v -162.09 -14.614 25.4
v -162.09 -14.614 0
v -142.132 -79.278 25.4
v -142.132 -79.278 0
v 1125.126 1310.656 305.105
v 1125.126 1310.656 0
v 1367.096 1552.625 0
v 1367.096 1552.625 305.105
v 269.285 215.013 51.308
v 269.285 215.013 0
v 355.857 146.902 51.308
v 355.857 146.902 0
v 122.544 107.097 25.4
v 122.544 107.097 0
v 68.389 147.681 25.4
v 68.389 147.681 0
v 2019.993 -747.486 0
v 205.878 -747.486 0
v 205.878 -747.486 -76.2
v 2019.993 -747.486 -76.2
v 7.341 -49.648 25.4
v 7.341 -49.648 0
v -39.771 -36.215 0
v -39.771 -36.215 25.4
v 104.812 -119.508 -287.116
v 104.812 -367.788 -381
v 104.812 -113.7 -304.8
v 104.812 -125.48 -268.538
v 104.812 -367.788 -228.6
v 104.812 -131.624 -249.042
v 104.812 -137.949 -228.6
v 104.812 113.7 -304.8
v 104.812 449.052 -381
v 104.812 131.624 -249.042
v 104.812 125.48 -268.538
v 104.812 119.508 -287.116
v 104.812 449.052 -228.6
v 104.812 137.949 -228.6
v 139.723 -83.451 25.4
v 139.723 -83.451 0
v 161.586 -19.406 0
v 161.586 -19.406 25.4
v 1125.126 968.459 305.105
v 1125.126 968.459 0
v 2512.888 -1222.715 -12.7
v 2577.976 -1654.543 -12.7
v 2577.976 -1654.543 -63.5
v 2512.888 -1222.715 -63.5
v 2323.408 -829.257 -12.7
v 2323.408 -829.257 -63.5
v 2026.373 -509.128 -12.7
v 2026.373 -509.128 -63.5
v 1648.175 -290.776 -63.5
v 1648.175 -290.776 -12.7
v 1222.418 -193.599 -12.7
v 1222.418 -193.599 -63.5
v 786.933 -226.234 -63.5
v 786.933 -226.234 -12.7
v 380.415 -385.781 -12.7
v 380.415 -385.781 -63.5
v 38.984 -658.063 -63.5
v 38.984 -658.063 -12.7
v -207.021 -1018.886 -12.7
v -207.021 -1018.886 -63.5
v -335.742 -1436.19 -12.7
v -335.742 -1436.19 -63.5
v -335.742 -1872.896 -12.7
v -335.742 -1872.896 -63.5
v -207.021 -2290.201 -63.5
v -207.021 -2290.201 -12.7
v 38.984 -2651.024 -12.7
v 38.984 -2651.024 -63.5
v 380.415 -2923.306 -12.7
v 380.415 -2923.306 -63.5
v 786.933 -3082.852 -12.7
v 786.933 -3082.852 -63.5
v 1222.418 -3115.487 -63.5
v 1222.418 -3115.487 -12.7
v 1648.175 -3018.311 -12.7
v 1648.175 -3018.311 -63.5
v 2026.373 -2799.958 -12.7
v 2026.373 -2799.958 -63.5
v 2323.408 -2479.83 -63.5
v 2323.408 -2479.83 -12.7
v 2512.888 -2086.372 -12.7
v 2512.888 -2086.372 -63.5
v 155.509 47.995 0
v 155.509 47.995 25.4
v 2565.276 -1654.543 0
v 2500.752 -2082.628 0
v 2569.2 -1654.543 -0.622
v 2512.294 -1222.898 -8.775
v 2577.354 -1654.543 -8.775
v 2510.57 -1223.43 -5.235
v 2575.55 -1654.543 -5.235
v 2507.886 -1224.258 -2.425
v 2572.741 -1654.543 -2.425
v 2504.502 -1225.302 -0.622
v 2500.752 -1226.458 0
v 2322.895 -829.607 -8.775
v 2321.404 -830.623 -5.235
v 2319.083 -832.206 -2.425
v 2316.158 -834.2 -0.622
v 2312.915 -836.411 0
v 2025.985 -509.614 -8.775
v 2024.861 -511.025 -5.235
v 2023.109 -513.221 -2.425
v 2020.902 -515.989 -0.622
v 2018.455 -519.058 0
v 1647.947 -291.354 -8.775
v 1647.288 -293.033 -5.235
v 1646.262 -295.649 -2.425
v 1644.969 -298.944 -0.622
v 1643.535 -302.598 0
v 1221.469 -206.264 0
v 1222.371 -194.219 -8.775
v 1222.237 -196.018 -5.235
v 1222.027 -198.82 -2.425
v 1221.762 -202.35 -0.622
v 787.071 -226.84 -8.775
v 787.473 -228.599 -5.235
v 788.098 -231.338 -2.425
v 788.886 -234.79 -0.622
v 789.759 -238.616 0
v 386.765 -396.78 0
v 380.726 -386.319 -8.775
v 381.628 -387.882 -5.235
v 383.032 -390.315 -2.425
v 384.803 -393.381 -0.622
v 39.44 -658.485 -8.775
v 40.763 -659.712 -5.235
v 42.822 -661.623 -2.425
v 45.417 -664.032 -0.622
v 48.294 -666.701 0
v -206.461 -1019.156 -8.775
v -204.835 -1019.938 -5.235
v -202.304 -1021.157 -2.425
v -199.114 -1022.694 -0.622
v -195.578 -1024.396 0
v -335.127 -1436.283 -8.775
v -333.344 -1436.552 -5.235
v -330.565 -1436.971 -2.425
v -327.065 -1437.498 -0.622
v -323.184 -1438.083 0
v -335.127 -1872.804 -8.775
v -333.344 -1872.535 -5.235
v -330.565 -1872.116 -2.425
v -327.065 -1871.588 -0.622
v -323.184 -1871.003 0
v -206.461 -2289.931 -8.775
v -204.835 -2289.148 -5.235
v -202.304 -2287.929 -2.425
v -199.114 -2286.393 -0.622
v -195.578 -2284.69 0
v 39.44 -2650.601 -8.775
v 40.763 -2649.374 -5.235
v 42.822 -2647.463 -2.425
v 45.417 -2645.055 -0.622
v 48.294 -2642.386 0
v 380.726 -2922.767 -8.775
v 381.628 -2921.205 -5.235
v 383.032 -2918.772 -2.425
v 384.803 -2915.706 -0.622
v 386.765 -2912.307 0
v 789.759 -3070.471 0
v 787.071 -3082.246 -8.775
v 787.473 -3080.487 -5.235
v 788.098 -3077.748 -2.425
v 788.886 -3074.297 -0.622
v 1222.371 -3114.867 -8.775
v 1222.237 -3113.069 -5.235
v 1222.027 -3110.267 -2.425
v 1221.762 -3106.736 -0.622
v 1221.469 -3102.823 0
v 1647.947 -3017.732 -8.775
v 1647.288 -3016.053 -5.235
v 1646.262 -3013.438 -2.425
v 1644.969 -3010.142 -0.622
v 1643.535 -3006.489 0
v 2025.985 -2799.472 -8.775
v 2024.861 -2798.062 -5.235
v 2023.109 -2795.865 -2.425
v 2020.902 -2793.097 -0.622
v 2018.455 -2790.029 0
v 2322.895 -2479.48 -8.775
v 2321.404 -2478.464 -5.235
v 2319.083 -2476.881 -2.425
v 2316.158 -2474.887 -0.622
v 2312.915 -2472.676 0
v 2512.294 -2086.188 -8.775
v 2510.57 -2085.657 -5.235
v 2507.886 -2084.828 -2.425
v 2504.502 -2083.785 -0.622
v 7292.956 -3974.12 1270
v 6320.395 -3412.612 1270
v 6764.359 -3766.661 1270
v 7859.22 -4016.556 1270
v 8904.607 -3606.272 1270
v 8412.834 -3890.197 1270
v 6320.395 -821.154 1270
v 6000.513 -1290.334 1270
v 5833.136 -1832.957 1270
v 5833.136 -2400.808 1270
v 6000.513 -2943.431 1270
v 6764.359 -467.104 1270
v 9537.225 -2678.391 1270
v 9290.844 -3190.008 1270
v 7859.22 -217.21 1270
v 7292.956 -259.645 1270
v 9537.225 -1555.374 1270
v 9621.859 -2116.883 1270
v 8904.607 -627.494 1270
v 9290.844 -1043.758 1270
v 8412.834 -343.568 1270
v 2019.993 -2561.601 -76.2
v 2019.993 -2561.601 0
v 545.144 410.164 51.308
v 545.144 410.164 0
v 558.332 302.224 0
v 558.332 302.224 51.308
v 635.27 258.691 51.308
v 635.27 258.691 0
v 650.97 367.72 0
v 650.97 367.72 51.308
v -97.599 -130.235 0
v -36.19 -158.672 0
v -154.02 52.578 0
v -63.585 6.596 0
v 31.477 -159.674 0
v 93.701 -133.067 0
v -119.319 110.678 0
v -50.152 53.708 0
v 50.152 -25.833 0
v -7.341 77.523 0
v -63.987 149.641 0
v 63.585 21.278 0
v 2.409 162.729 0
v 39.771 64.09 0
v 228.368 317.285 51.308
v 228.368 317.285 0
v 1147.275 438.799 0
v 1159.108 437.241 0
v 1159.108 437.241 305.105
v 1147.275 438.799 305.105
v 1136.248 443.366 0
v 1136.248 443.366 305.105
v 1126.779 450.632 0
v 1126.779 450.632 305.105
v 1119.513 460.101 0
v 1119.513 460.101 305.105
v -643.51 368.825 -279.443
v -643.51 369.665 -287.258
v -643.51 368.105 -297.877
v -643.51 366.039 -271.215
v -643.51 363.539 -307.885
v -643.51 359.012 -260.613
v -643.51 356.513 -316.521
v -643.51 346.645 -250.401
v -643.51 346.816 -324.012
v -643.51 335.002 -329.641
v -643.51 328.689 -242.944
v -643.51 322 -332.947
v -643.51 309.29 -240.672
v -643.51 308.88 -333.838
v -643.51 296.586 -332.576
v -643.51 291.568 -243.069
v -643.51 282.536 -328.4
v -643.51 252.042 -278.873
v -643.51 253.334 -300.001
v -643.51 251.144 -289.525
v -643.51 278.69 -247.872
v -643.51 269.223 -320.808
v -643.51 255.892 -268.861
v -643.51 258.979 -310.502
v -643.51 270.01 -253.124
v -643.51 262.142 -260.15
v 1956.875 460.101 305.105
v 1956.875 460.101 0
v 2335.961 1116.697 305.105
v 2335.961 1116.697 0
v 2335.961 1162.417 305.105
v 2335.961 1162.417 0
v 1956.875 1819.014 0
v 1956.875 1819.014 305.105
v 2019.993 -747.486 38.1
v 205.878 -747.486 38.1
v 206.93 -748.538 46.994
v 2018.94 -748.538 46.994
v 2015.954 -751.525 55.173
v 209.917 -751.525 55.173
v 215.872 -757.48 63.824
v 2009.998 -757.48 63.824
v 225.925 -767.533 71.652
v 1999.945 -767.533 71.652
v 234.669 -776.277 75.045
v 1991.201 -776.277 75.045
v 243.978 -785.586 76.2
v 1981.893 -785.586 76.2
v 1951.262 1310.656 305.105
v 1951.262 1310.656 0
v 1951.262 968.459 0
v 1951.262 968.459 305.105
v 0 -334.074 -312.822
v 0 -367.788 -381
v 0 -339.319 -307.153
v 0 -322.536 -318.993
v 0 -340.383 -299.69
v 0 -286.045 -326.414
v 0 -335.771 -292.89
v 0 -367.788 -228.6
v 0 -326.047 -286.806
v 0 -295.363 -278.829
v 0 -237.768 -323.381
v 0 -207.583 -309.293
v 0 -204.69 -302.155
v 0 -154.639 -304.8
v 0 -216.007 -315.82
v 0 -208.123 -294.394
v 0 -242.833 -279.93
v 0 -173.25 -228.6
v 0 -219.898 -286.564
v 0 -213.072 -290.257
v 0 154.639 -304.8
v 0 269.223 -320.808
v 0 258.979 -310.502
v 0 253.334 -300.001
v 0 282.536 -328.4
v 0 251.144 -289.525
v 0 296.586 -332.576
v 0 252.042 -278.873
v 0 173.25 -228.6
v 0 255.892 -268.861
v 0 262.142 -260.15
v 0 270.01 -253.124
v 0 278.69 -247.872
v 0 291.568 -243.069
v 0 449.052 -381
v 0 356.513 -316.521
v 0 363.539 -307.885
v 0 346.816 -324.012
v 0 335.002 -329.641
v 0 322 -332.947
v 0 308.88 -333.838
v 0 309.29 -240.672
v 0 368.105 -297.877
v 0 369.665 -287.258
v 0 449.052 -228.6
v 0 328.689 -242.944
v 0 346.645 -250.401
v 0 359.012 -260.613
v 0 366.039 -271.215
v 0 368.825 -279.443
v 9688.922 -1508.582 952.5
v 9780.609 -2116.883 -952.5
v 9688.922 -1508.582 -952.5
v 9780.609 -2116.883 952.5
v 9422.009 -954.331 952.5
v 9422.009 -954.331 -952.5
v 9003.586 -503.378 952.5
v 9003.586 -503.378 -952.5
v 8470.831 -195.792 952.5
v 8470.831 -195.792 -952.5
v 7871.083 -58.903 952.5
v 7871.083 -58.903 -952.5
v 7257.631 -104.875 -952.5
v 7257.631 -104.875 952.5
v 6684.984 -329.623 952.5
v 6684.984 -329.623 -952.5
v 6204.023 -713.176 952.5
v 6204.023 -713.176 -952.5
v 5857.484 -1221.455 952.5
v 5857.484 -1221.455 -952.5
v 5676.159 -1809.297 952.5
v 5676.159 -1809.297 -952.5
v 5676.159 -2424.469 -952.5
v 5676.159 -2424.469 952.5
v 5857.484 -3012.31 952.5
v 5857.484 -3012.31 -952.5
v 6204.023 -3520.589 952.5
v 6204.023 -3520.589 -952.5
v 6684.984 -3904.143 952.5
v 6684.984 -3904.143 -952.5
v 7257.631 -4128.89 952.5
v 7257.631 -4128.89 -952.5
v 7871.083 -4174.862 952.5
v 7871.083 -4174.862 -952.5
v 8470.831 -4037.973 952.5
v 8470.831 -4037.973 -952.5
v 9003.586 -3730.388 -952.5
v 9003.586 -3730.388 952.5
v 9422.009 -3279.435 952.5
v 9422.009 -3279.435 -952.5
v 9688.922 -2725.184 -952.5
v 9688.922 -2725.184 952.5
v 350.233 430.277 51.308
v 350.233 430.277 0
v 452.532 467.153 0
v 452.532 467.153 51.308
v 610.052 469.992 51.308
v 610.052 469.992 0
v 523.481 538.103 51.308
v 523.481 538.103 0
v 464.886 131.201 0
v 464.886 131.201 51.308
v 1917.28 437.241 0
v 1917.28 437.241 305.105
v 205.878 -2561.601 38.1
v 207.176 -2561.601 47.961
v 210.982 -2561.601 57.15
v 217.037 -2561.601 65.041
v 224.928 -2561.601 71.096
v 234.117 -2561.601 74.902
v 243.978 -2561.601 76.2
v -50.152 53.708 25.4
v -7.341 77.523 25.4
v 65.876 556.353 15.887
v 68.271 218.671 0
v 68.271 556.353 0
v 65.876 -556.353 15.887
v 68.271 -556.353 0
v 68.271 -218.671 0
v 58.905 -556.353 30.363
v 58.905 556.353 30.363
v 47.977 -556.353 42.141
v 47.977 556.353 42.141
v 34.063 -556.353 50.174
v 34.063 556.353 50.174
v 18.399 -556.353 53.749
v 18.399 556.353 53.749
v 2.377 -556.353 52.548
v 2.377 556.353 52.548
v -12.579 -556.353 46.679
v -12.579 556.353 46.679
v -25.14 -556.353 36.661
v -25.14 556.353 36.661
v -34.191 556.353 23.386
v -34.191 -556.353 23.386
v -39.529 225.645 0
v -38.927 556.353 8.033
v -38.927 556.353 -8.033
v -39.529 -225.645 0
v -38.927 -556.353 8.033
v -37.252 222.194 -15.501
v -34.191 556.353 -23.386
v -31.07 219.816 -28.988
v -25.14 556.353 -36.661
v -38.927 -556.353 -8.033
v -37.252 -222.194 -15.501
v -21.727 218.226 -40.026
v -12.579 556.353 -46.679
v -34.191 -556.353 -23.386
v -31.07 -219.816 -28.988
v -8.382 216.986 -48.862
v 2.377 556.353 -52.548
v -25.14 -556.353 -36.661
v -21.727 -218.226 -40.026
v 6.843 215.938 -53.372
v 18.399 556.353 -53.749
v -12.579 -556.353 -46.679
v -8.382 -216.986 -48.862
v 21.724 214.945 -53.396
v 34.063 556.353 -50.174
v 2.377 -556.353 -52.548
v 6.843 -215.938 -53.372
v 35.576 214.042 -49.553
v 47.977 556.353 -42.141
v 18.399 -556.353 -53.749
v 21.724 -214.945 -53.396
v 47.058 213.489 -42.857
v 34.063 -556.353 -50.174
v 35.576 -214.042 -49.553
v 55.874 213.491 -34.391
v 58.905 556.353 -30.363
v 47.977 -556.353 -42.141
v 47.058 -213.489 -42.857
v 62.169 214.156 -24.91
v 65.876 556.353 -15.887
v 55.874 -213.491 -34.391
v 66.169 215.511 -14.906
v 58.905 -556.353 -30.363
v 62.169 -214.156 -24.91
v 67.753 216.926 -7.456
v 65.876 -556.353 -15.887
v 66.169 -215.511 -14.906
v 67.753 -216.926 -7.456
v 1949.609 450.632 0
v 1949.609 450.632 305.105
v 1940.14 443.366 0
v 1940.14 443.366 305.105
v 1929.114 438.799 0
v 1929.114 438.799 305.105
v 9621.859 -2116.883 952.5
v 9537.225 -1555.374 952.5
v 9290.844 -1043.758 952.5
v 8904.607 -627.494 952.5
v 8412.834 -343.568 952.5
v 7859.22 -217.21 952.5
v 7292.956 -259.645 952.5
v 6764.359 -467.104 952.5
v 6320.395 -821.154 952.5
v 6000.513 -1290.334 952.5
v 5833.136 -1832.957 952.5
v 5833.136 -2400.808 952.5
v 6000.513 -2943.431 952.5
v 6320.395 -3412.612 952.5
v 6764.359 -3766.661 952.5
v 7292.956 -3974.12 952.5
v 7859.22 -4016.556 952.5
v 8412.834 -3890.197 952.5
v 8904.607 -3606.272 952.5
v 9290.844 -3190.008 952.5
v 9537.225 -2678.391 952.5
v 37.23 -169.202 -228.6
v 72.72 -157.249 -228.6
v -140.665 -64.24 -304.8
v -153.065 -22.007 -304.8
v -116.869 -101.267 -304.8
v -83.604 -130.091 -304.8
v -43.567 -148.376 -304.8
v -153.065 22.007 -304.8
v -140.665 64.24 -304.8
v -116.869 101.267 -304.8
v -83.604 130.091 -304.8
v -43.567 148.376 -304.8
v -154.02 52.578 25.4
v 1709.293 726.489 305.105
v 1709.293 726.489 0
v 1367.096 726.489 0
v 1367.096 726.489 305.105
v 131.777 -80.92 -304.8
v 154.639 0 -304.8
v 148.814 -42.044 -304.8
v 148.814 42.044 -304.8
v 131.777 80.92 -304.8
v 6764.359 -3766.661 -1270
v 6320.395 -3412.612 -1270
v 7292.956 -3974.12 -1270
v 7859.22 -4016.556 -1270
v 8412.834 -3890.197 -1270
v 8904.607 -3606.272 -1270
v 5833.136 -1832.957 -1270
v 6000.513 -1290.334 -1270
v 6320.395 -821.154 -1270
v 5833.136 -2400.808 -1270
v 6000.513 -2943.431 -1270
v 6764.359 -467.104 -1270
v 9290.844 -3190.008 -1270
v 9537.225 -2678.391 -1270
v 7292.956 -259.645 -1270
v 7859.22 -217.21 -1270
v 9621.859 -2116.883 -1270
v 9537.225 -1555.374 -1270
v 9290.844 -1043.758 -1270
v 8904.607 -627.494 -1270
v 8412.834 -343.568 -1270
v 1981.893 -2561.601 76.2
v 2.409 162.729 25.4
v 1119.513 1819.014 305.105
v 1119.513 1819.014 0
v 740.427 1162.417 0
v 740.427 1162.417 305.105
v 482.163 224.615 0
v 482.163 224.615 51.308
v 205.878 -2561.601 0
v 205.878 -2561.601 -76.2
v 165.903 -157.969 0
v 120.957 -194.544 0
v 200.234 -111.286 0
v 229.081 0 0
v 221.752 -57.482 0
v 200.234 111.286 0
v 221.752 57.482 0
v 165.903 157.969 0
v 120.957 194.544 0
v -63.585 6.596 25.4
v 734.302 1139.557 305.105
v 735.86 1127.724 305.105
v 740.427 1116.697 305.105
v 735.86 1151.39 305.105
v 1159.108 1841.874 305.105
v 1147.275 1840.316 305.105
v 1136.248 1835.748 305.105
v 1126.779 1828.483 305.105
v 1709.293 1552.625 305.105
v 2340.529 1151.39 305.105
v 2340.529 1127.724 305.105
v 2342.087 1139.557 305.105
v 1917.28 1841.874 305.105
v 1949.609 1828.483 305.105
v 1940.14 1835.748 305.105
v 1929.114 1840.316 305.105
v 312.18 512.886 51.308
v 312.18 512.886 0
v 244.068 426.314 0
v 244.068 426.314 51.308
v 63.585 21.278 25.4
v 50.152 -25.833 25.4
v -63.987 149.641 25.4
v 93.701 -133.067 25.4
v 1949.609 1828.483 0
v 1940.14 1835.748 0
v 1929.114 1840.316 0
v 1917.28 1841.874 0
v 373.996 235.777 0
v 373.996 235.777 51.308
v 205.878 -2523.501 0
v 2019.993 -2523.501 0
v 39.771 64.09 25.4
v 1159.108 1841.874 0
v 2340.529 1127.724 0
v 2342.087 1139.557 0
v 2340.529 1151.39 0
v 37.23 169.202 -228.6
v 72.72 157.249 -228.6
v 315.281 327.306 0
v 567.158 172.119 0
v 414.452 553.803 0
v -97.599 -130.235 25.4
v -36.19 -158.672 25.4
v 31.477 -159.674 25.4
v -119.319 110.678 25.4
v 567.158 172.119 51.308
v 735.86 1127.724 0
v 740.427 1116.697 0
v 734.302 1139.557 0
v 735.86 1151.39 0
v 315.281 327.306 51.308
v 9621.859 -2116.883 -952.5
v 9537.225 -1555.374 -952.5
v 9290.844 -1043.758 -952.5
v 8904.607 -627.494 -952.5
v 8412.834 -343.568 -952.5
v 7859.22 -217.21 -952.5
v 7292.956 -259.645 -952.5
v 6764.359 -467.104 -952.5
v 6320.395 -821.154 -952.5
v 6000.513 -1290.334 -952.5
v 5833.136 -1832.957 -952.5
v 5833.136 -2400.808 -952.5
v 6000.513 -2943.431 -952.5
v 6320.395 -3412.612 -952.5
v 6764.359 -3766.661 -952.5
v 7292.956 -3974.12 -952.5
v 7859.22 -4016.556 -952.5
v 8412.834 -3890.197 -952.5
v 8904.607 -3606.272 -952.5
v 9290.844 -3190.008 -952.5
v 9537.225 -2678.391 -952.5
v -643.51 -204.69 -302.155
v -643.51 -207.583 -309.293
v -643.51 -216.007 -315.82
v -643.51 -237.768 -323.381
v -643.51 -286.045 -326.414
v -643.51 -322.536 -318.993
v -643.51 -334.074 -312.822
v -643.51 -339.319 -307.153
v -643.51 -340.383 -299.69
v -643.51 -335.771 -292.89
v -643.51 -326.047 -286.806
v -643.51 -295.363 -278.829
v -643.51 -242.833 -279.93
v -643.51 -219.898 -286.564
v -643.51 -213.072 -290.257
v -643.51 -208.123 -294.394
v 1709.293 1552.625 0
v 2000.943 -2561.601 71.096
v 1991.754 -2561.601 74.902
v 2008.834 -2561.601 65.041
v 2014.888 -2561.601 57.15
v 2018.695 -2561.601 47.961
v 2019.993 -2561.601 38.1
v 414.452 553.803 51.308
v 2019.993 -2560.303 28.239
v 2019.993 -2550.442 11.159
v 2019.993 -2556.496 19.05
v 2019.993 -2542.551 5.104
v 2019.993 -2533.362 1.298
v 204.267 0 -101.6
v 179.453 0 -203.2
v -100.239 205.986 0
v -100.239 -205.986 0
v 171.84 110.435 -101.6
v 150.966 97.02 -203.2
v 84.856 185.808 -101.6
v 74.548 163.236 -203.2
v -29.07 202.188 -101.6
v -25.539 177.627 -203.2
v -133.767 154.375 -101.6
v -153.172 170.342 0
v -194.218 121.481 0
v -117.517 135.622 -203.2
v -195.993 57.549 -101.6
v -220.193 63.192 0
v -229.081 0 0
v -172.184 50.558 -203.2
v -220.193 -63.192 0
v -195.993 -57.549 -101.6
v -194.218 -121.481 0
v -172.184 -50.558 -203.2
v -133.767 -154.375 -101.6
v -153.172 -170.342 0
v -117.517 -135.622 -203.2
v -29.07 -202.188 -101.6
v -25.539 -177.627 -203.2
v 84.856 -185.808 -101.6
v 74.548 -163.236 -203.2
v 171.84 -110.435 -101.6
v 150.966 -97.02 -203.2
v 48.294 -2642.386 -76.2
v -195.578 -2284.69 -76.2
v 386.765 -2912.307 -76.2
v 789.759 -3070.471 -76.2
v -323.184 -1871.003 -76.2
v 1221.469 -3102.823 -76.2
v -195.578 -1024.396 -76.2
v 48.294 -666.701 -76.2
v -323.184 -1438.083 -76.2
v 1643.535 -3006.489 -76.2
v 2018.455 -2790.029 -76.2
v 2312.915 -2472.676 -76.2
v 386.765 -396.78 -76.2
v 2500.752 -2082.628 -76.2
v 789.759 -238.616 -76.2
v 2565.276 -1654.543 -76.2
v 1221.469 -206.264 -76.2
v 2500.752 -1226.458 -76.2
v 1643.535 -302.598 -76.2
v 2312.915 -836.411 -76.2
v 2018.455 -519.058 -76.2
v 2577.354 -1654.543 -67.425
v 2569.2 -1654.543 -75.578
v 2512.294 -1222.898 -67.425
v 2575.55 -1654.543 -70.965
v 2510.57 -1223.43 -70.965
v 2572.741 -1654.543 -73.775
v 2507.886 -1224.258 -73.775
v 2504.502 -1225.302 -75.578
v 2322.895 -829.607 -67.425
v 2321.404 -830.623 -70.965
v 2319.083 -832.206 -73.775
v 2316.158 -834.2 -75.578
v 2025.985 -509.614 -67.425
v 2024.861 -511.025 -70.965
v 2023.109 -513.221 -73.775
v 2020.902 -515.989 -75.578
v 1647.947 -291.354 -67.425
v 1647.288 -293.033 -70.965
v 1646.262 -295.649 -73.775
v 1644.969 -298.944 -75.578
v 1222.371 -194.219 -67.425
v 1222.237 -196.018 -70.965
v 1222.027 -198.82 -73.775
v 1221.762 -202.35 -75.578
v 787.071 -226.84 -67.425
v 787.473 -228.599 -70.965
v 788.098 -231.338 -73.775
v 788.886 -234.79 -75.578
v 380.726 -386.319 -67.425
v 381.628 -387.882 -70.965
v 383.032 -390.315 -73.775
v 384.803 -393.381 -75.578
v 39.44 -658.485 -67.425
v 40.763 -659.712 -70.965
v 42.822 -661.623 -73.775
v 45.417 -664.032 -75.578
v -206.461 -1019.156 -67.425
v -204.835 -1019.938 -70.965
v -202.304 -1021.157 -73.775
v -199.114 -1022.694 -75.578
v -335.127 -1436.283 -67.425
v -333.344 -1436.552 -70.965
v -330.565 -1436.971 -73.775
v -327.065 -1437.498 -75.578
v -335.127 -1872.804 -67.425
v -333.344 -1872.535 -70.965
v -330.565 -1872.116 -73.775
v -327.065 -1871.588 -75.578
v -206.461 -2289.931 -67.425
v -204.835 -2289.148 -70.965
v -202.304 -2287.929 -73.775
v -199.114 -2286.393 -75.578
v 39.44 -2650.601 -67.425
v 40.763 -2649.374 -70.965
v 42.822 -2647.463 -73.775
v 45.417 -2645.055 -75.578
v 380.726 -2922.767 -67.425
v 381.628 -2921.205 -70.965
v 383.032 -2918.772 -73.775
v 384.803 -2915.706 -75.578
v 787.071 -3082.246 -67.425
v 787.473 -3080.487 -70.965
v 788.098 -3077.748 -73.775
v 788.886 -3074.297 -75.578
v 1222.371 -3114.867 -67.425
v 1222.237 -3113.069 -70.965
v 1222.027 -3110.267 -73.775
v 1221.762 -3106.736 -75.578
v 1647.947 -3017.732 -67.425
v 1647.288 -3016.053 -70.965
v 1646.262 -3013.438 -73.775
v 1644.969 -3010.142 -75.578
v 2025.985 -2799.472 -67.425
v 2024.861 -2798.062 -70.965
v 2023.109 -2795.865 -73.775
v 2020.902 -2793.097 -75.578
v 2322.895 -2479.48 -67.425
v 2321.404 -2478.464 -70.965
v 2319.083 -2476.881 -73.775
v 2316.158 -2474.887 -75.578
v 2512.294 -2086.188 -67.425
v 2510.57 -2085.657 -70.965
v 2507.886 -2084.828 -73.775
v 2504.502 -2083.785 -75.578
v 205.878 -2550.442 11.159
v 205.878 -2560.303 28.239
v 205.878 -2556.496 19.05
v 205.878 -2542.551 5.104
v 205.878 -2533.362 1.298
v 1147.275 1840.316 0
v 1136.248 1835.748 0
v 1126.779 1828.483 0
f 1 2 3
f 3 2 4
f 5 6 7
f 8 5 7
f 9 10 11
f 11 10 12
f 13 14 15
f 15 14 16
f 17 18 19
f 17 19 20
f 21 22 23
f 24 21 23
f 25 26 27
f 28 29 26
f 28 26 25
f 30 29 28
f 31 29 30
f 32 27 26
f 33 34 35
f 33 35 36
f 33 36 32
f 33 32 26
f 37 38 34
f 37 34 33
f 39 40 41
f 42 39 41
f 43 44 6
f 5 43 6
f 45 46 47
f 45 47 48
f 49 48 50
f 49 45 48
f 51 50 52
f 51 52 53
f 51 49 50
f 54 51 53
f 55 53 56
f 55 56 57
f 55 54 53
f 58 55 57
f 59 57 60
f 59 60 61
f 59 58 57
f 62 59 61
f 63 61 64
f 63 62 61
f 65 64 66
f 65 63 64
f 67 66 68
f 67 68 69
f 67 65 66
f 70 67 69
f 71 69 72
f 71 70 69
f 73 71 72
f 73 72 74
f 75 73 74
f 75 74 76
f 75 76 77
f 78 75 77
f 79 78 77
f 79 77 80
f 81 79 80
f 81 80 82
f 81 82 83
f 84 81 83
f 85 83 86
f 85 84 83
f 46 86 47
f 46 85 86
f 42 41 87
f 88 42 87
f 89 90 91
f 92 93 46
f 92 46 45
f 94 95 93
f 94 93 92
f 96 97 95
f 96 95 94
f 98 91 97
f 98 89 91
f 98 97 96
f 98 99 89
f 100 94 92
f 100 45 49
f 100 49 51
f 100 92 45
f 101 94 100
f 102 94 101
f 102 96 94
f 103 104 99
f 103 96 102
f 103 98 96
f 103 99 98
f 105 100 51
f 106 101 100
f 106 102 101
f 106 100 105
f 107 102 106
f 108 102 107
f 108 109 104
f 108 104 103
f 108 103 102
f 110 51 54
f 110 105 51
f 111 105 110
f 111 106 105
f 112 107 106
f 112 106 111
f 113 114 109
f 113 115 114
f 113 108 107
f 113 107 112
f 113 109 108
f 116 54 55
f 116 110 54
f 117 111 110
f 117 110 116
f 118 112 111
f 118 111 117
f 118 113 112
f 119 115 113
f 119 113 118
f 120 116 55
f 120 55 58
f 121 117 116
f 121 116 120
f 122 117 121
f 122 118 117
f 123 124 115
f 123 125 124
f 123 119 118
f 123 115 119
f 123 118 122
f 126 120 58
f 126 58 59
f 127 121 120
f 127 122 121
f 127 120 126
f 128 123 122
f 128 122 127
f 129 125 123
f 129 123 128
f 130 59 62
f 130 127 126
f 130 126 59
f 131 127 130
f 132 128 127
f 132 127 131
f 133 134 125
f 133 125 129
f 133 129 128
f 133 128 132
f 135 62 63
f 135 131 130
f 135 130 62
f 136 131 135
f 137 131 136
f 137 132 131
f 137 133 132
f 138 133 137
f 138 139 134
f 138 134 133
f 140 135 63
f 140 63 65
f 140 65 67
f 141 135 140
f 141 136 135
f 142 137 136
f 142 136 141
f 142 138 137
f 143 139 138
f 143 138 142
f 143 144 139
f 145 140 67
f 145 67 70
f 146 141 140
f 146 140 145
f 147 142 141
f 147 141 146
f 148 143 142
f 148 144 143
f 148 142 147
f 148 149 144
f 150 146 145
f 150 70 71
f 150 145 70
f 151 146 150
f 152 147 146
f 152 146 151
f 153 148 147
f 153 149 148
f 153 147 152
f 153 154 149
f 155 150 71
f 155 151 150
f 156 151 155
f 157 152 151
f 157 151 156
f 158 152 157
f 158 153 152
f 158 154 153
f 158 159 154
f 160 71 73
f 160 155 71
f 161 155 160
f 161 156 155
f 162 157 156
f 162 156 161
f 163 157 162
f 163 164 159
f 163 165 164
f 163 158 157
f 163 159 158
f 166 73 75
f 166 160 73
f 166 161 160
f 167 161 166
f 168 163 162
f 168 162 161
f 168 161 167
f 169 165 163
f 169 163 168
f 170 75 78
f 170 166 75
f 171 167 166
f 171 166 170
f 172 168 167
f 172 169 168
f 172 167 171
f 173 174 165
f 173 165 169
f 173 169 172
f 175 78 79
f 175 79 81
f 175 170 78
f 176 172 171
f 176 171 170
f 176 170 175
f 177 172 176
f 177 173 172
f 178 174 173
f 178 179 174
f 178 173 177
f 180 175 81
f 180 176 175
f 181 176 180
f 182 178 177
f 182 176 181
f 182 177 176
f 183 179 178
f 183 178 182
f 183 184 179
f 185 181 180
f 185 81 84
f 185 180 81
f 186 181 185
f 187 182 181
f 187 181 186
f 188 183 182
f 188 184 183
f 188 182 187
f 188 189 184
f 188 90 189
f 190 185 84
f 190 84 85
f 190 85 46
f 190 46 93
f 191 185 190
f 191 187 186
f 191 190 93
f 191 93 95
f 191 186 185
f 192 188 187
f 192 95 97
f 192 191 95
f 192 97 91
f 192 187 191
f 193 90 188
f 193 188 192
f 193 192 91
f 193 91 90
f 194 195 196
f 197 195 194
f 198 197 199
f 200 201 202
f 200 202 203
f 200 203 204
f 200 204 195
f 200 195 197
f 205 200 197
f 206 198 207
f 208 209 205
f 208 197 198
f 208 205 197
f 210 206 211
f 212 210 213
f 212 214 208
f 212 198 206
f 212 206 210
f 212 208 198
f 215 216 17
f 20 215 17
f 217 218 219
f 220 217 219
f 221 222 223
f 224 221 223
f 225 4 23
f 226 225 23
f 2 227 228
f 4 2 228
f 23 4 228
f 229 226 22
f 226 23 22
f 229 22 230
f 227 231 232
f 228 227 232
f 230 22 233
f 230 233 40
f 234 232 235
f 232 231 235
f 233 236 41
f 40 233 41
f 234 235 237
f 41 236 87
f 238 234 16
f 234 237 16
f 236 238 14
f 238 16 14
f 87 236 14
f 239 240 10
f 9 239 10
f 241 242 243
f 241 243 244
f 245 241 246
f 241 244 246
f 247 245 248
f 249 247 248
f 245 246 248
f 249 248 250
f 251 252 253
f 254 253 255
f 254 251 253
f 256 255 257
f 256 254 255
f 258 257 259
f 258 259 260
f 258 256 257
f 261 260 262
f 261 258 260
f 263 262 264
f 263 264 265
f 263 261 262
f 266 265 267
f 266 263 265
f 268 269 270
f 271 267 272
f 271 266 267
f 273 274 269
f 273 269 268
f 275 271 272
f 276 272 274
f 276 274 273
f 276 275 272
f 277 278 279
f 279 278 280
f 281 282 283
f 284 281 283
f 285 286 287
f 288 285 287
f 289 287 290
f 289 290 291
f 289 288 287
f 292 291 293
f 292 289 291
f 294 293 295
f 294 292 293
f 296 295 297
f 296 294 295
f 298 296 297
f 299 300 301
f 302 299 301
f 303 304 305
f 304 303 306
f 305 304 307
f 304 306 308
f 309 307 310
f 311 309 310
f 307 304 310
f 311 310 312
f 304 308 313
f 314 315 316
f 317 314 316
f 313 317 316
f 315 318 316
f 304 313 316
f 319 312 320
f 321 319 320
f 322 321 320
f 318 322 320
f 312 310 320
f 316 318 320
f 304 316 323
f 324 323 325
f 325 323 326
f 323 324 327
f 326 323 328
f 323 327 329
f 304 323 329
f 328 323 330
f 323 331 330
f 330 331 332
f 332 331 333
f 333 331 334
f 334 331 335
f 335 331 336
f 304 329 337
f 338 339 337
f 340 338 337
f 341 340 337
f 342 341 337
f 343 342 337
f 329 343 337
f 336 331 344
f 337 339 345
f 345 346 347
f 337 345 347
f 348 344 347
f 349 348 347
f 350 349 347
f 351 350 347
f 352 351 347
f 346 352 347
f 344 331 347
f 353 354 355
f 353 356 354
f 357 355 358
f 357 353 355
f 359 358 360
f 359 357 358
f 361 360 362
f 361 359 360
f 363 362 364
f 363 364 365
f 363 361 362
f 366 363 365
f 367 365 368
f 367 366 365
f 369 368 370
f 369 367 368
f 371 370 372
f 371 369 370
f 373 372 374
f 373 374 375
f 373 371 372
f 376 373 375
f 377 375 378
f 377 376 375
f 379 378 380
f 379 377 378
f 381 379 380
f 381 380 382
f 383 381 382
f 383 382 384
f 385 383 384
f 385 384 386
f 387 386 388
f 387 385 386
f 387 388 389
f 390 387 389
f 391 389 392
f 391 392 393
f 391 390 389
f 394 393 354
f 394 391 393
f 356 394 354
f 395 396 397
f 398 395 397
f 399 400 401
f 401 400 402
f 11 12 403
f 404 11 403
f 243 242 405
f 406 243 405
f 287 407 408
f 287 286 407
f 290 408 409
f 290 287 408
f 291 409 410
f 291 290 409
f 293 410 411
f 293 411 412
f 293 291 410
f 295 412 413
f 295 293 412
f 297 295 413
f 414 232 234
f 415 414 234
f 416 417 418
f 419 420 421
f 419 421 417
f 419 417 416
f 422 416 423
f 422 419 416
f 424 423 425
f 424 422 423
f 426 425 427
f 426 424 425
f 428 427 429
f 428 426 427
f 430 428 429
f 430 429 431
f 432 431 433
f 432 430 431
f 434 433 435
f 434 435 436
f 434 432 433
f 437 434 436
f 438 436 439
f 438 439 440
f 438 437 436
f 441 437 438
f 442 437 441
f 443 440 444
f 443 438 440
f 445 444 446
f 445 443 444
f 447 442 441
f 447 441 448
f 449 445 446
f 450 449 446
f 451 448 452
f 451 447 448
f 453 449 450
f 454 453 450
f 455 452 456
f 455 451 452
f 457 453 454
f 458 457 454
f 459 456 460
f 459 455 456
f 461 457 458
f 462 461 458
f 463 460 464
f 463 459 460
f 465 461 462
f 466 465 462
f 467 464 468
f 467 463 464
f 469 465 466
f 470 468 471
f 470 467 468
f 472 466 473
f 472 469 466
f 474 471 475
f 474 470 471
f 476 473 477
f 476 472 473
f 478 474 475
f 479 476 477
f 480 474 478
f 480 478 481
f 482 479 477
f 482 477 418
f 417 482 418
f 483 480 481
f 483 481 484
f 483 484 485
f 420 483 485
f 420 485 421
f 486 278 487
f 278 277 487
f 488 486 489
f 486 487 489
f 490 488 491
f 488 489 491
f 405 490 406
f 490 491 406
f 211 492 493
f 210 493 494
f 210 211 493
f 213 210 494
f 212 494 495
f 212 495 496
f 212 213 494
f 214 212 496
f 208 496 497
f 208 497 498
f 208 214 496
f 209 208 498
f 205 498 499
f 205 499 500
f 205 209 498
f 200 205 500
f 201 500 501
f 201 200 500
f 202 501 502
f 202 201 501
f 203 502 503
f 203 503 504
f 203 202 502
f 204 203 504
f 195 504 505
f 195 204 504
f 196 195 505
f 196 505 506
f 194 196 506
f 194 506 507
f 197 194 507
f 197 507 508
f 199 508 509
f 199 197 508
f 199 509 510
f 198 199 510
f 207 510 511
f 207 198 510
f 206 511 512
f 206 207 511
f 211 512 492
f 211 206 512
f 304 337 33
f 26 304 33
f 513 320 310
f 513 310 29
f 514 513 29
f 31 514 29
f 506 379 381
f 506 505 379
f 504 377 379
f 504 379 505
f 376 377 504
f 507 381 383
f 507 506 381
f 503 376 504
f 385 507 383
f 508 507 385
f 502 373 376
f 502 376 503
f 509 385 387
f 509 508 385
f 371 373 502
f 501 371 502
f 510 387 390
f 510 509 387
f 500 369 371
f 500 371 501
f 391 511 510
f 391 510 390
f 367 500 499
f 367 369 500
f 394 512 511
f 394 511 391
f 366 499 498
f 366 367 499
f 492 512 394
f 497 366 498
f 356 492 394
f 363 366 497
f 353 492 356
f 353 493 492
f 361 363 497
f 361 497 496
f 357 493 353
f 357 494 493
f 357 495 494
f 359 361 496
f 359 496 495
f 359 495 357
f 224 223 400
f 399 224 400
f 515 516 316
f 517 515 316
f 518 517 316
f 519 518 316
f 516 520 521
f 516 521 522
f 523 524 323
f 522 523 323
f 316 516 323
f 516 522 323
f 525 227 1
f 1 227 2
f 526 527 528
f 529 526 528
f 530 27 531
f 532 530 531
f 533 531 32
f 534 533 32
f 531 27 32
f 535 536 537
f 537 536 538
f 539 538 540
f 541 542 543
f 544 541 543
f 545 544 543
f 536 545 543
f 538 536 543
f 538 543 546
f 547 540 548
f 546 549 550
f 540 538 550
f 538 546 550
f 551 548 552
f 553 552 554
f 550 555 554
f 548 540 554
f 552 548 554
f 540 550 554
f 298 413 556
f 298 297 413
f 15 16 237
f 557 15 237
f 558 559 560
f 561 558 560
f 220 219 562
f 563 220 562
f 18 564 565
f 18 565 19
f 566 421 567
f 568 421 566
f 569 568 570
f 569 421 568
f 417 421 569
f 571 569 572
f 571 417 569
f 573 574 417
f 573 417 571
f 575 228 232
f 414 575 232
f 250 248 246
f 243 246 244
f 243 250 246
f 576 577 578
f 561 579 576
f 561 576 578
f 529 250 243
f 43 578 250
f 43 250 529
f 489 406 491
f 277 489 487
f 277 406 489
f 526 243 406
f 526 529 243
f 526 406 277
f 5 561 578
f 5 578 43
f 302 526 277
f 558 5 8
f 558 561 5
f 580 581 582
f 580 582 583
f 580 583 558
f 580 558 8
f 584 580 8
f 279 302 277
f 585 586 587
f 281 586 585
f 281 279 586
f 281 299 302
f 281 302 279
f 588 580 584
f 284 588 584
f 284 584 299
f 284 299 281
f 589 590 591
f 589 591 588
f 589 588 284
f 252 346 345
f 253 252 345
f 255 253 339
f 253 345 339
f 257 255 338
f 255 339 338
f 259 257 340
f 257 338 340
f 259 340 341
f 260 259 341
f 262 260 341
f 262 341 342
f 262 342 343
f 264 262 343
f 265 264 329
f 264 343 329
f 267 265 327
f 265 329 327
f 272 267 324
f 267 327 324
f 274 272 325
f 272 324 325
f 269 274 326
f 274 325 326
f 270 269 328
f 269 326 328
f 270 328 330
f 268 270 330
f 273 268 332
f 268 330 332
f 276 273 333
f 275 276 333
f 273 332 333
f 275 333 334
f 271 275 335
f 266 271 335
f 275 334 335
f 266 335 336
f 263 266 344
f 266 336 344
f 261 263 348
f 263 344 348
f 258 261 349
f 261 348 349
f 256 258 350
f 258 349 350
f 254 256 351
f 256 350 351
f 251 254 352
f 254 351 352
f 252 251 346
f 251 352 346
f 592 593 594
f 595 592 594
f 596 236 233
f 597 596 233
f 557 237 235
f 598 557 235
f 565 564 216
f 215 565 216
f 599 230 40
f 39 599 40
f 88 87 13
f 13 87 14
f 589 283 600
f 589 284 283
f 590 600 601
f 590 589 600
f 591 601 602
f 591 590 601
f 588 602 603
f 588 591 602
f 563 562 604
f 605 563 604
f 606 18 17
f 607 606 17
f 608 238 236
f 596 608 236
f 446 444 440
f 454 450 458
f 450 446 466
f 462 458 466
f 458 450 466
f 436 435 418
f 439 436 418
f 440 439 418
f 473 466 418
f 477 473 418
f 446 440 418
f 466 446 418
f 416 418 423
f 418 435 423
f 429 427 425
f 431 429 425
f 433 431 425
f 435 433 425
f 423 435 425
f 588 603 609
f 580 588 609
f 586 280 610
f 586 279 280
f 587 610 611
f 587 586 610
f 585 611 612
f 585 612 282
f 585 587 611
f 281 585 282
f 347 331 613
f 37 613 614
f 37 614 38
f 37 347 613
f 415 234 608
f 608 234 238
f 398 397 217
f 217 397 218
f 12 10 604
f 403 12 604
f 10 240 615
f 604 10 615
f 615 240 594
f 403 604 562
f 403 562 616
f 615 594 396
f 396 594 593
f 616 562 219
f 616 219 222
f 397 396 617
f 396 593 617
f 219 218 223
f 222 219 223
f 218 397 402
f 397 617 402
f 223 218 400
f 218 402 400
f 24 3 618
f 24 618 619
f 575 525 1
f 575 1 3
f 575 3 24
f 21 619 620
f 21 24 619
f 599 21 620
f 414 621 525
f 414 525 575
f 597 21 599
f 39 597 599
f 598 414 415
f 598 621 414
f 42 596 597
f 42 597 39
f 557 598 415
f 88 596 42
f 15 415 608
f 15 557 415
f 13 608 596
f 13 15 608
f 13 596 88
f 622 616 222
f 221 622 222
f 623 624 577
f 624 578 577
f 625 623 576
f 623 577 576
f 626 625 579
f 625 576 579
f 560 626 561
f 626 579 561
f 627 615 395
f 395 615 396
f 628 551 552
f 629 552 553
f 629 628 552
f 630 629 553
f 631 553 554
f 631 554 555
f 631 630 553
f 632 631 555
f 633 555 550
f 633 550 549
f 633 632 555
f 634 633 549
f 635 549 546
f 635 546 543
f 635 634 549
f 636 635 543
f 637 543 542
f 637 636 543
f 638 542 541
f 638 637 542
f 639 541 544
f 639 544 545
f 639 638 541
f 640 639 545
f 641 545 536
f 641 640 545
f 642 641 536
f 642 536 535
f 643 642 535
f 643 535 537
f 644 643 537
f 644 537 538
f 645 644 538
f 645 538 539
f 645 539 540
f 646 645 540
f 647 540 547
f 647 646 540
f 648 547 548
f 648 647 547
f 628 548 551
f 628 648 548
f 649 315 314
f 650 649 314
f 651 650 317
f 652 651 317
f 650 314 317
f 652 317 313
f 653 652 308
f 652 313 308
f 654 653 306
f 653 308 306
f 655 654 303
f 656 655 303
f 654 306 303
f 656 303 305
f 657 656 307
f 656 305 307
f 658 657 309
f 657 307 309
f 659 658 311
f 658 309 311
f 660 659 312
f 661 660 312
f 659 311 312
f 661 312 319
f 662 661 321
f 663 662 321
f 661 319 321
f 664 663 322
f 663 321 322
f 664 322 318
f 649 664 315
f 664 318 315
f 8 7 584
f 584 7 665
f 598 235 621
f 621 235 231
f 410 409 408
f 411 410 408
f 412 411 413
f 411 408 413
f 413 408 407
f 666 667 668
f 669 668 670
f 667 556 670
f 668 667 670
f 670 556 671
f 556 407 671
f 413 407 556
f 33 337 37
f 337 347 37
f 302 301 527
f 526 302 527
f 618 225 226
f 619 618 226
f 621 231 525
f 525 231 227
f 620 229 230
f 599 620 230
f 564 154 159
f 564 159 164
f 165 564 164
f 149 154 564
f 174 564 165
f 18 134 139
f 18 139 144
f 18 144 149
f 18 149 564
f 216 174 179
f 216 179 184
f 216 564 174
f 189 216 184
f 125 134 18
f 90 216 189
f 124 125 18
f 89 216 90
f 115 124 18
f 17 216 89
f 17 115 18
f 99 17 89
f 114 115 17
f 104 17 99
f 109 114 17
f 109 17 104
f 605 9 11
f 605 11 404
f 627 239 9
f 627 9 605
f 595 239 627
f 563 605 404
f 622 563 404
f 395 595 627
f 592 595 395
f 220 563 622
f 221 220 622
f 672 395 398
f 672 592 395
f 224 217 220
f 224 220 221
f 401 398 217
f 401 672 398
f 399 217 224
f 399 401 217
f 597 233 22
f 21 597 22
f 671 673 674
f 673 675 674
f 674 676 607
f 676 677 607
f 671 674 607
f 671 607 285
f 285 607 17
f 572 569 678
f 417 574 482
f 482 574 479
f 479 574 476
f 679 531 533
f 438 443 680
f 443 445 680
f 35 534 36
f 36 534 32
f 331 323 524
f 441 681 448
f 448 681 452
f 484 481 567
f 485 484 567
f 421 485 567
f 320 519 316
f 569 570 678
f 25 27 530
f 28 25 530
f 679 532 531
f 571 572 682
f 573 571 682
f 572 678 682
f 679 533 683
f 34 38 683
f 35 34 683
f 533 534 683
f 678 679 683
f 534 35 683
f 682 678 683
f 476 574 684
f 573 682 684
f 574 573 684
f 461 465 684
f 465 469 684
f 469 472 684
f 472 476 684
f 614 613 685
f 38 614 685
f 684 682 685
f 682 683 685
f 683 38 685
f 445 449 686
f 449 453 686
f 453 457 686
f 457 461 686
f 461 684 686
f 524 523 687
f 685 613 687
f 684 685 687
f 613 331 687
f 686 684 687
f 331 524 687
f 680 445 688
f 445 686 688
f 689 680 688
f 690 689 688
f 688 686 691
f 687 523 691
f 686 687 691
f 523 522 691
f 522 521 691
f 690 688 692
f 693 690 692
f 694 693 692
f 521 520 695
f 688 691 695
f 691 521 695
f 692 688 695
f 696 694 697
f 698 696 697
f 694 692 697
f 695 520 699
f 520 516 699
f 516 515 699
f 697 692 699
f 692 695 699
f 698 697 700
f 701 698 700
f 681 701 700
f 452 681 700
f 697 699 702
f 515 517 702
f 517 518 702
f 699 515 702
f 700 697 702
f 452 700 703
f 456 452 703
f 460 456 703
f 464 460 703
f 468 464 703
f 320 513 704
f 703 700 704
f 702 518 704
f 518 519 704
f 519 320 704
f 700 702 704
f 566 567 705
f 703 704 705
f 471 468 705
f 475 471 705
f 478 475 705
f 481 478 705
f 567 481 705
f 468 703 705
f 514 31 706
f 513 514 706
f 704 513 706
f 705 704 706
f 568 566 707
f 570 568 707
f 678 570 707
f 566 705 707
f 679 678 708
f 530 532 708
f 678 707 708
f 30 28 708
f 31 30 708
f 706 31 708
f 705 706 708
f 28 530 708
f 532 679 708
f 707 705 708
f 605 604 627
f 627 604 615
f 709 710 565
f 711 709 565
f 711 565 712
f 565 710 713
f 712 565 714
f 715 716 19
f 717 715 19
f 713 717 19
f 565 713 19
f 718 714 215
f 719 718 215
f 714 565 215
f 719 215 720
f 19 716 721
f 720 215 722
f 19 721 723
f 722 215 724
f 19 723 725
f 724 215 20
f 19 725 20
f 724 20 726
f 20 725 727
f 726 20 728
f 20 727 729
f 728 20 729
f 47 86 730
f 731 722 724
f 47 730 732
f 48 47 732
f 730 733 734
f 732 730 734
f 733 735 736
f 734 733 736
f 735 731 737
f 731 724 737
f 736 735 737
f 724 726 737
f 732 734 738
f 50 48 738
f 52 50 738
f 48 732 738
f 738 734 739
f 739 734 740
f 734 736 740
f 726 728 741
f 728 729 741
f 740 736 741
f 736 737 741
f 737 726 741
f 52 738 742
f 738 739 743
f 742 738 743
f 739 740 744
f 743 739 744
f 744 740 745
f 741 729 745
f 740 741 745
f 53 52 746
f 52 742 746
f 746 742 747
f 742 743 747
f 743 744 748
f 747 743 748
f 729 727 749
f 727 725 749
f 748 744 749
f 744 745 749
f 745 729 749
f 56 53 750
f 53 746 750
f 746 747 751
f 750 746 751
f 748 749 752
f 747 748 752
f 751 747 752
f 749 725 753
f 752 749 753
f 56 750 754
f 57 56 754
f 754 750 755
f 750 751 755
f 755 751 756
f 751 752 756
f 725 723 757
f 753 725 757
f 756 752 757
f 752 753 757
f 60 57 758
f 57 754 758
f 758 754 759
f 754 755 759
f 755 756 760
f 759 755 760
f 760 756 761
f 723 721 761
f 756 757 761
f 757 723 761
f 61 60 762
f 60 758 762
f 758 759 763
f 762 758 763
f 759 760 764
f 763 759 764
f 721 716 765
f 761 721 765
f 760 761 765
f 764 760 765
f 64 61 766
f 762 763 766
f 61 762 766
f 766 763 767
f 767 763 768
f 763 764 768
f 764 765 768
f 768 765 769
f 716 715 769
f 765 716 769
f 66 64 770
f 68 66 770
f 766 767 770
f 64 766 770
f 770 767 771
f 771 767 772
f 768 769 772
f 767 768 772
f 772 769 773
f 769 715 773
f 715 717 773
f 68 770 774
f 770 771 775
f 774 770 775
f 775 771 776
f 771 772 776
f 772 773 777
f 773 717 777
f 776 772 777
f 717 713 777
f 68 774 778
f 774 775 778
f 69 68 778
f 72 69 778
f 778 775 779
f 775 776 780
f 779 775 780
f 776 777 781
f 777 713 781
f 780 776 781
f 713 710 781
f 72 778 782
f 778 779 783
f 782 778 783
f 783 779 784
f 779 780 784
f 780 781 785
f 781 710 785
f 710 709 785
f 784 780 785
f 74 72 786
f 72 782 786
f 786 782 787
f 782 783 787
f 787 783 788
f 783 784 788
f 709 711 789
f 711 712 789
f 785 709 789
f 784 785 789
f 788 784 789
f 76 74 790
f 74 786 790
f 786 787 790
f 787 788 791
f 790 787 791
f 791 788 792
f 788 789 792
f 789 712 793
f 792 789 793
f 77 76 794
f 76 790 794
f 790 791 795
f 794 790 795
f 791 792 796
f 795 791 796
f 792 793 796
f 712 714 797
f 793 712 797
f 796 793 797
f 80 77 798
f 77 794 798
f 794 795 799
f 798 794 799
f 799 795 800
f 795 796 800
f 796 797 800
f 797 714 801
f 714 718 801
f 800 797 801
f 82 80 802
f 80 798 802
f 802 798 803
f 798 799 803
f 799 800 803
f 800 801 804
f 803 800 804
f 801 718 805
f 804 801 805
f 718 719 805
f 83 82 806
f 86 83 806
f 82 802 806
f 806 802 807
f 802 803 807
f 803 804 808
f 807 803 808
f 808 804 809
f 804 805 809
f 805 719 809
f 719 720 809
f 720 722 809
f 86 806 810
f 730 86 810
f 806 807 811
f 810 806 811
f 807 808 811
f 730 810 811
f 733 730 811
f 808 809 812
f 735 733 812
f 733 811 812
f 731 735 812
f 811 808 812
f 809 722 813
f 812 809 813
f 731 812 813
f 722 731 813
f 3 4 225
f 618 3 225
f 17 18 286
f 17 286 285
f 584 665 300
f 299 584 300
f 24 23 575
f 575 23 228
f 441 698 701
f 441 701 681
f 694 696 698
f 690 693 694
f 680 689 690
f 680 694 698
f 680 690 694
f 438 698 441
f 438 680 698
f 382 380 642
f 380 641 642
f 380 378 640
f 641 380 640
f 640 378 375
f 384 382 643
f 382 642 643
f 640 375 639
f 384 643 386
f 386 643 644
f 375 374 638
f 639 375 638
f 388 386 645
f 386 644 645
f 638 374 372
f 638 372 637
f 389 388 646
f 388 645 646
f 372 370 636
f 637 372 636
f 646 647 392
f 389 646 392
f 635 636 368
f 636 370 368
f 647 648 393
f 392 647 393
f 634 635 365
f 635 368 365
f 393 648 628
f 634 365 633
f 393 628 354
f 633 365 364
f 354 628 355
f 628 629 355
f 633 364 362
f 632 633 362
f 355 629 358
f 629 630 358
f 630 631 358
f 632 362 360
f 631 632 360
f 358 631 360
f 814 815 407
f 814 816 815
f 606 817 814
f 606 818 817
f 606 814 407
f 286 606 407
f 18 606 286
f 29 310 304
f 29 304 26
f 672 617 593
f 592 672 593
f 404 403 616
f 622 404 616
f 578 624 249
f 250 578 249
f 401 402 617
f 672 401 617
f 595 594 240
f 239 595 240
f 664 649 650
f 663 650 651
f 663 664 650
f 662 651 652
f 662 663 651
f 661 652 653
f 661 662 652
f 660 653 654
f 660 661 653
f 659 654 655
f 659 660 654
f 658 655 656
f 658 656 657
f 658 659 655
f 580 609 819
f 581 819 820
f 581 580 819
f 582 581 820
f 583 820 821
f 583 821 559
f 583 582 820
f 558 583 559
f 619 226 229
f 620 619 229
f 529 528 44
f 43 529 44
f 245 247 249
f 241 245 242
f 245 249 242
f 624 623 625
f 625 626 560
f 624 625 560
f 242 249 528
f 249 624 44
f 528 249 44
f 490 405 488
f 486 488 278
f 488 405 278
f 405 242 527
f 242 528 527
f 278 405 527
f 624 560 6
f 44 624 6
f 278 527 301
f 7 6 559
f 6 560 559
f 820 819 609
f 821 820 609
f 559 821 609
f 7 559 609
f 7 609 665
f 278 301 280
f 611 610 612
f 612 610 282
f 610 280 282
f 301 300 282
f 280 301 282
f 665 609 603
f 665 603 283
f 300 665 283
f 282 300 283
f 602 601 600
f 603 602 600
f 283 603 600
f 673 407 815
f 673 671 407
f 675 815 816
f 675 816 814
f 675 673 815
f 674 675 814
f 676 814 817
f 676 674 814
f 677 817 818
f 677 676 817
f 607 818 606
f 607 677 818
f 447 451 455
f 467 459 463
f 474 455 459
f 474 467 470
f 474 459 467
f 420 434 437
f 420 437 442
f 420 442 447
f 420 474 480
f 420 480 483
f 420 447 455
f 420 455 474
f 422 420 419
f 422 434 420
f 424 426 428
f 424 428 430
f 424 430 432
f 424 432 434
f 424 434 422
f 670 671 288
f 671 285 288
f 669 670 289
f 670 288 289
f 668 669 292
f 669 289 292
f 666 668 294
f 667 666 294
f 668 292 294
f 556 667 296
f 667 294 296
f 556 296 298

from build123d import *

# Parameters (mm, degrees)
F1_DEPTH  = 25.4
F3_DEPTH  = 51.308
F5_DEPTH  = 305.1048
F6_R      = 45.72
F7_R      = 1465.0405111475
F7_W      = 1814.1152858734
F7_H      = 1814.1152858734
F8_DEPTH  = 76.2
F9_DEPTH  = 76.2
F10_R     = 38.09999
F11_R     = 12.7
F12_R     = 1905
F13_DEPTH = 1270
F12_R_2   = 2063.75
F14_DEPTH = 952.5
F19_R     = 229.0809109199
F21_R     = 154.6394893279
F23_W     = 104.8123165965
F23_H     = 816.8393224478
F24_DEPTH = 76.2
F26_DEPTH = 643.5099393129
F27_R     = 53.8997804339
F28_DEPTH = 556.3534796238


# Not quite as in the source:
# - a fillet or chamfer is up to 0.001 mm smaller than in the source, because OpenCascade refuses the exact size
# - the program builds the solid bodies; features that only make, move or delete a surface that nothing else refers to are left out


with BuildPart() as f1:
    # F0 (on Top) → F1 (new body)
    with BuildSketch(Plane.XY):
        Polygon((155.50936864, 47.9948012801), (122.5436329842, 107.0967912674), (68.3889899114, 147.6807731007), (2.4092691885, 162.7294076272), (-63.9870360646, 149.6406492247), (-119.3194014782, 110.6776631286), (-154.0203583934, 52.5775036026), (-162.0897961115, -14.6137839479), (-142.1324355422, -79.2782154918), (-97.5990856351, -130.2347233572), (-36.1899671618, -158.6724644088), (31.4767254093, -159.67429487), (93.7008062, -133.0669891528), (139.7231663537, -83.4511921354), (161.5861216997, -19.4059258675), align=None)
        Polygon((39.7706934855, 64.0896567419), (63.5851919651, 21.2782472372), (50.1523473576, -25.8333841012), (7.3409378529, -49.6478825808), (-39.7706934855, -36.2150379733), (-63.5851919651, 6.5963715315), (-50.1523473576, 53.7080028699), (-7.3409378529, 77.5225013494), align=None, mode=Mode.SUBTRACT)
    extrude(amount=F1_DEPTH)


with BuildPart() as f3:
    # F2 (on Top) → F3 (new body)
    with BuildSketch(Plane.XY):
        Polygon((567.1581641405, 172.1189159194), (635.2695226669, 258.6906254292), (650.9698346822, 367.7196043769), (610.052214261, 469.9916259019), (523.4805047512, 538.1029844284), (414.4515258035, 553.8032964437), (312.1795042784, 512.8856760224), (244.068145752, 426.3139665127), (228.3678337366, 317.284987565), (269.2854541579, 215.0129660399), (355.8571636677, 146.9016075134), (464.8861426154, 131.2012954981), align=None)
        Polygon((545.1443835194, 410.1638138472), (558.3316683769, 302.2244572639), (482.1634188256, 224.6151347452), (373.9958803268, 235.7772490893), (315.2814155857, 327.3055005294), (350.2332141092, 430.2772488952), (452.5318587224, 467.1526674262), align=None, mode=Mode.SUBTRACT)
    extrude(amount=F3_DEPTH)


with BuildPart() as f5:
    # F4 (on Top) → F5 (new body)
    with BuildSketch(Plane.XY):
        Polygon((1943.6769121667, 437.2407213386), (2349.1595144473, 1139.5571900737), (1943.6769121667, 1841.8736588088), (1132.7117076057, 1841.8736588088), (727.2291053252, 1139.5571900737), (1132.7117076057, 437.2407213386), align=None)
        Polygon((1709.2926557119, 1552.6251370658), (1951.2622568783, 1310.6555358994), (1951.2622568783, 968.458844248), (1709.2926557119, 726.4892430816), (1367.0959640605, 726.4892430816), (1125.1263628941, 968.458844248), (1125.1263628941, 1310.6555358994), (1367.0959640605, 1552.6251370658), align=None, mode=Mode.SUBTRACT)
    extrude(amount=F5_DEPTH)

    # F6
    f6_edges = [f5.edges().sort_by_distance(p)[0] for p in [
        (1943.676912, 437.240721, 152.5524),
        (2349.159514, 1139.55719, 152.5524),
        (1943.676912, 1841.873659, 152.5524),
        (1132.711708, 1841.873659, 152.5524),
        (727.229105, 1139.55719, 152.5524),
        (1132.711708, 437.240721, 152.5524),
    ]]
    fillet(f6_edges, radius=F6_R)


with BuildPart() as f8:
    # F7 (on Top) → F8 (new body)
    with BuildSketch(Plane.XY):
        with Locations((1112.9351854324, -1654.5432806015)):
            Circle(F7_R)
        with Locations((1112.9351854324, -1654.5432806015)):
            Rectangle(F7_W, F7_H, mode=Mode.SUBTRACT)
    extrude(amount=-F8_DEPTH)

    # F11
    f11_edges = [f8.edges().sort_by_distance(p)[0] for p in [
        (-352.105326, -1654.543281, 0),
        (-352.105326, -1654.543281, -76.2),
    ]]
    fillet(f11_edges, radius=F11_R)


with BuildPart() as f9:
    # F7 (on Top) → F9 (new body)
    with BuildSketch(Plane.XY):
        with Locations((1112.9351854324, -1654.5432806015)):
            Rectangle(F7_W, F7_H)
    extrude(amount=F9_DEPTH)

    # F10 (radius 38.1 in the source; OpenCascade refuses exactly that, so slightly less here)
    f10_edges = [f9.edges().sort_by_distance(p)[0] for p in [
        (205.877542, -1654.543281, 76.2),
        (2019.992828, -1654.543281, 76.2),
        (1112.935185, -2561.600924, 0),
        (1112.935185, -747.485638, 76.2),
    ]]
    fillet(f10_edges, radius=F10_R)


with BuildPart() as f13:
    # F12 (on Top) → F13 (new body, symmetric)
    with BuildSketch(Plane.XY):
        with Locations((7716.8588638306, -2116.8828010559)):
            Circle(F12_R)
    extrude(amount=F13_DEPTH, both=True)

    # F12 (on Top) → F14 (join, symmetric)
    with BuildSketch(Plane.XY):
        with Locations((7716.8588638306, -2116.8828010559)):
            Circle(F12_R_2)
        with Locations((7716.8588638306, -2116.8828010559)):
            Circle(F12_R, mode=Mode.SUBTRACT)
    extrude(amount=F14_DEPTH, both=True)


with BuildPart() as f22:
    # F19 (on Top) → F22 section 0
    with BuildSketch(Plane.XY):
        Circle(F19_R)
    # F21 (on offset) → F22 section 1
    with BuildSketch(Plane.XY.offset(-304.8)):
        Circle(F21_R)
    loft()

    # F23 (on offset) → F24 (join, symmetric)
    with BuildSketch(Plane.XY.offset(-304.8)):
        with Locations((52.4061582983, 40.6319275498)):
            Rectangle(F23_W, F23_H)
    extrude(amount=F24_DEPTH, both=True)

    # F25 (on face) → F26 (join)
    with BuildSketch(Plane(origin=(0, 0, 0), x_dir=(0, -1, 0), z_dir=(-1, 0, 0))):
        with BuildLine():
            add(Edge.make_bspline(
                [(204.6898007393, -302.1550476551), (204.6898007393, -345.0046976312), (306.7133426666, -323.5798726431), (408.736884594, -302.1550476551), (306.7133426666, -280.7302226671), (204.6898007393, -259.305397679), (204.6898007393, -302.1550476551)],
                knots=[0, 0, 0, 2.0943951024, 2.0943951024, 4.1887902048, 4.1887902048, 6.2831853072, 6.2831853072, 6.2831853072], degree=2, weights=[1, 0.5, 1, 0.5, 1, 0.5, 1]))
        make_face()
        with BuildLine():
            add(Edge.make_bspline(
                [(-369.6652650833, -287.2584462166), (-369.6652650833, -367.9612465382), (-280.7216048241, -327.6098463774), (-191.7779445648, -287.2584462166), (-280.7216048241, -246.9070460558), (-369.6652650833, -206.555645895), (-369.6652650833, -287.2584462166)],
                knots=[0, 0, 0, 2.0943951024, 2.0943951024, 4.1887902048, 4.1887902048, 6.2831853072, 6.2831853072, 6.2831853072], degree=2, weights=[1, 0.5, 1, 0.5, 1, 0.5, 1]))
        make_face()
    extrude(amount=F26_DEPTH)

    # F27 (on Front) → F28 (join, symmetric)
    with BuildSketch(Plane.XZ):
        with Locations((14.3709331751, 0)):
            Circle(F27_R)
    extrude(amount=F28_DEPTH, both=True)


solid = Compound([f1.part, f3.part, f5.part, f8.part, f9.part, f13.part, f22.part])
